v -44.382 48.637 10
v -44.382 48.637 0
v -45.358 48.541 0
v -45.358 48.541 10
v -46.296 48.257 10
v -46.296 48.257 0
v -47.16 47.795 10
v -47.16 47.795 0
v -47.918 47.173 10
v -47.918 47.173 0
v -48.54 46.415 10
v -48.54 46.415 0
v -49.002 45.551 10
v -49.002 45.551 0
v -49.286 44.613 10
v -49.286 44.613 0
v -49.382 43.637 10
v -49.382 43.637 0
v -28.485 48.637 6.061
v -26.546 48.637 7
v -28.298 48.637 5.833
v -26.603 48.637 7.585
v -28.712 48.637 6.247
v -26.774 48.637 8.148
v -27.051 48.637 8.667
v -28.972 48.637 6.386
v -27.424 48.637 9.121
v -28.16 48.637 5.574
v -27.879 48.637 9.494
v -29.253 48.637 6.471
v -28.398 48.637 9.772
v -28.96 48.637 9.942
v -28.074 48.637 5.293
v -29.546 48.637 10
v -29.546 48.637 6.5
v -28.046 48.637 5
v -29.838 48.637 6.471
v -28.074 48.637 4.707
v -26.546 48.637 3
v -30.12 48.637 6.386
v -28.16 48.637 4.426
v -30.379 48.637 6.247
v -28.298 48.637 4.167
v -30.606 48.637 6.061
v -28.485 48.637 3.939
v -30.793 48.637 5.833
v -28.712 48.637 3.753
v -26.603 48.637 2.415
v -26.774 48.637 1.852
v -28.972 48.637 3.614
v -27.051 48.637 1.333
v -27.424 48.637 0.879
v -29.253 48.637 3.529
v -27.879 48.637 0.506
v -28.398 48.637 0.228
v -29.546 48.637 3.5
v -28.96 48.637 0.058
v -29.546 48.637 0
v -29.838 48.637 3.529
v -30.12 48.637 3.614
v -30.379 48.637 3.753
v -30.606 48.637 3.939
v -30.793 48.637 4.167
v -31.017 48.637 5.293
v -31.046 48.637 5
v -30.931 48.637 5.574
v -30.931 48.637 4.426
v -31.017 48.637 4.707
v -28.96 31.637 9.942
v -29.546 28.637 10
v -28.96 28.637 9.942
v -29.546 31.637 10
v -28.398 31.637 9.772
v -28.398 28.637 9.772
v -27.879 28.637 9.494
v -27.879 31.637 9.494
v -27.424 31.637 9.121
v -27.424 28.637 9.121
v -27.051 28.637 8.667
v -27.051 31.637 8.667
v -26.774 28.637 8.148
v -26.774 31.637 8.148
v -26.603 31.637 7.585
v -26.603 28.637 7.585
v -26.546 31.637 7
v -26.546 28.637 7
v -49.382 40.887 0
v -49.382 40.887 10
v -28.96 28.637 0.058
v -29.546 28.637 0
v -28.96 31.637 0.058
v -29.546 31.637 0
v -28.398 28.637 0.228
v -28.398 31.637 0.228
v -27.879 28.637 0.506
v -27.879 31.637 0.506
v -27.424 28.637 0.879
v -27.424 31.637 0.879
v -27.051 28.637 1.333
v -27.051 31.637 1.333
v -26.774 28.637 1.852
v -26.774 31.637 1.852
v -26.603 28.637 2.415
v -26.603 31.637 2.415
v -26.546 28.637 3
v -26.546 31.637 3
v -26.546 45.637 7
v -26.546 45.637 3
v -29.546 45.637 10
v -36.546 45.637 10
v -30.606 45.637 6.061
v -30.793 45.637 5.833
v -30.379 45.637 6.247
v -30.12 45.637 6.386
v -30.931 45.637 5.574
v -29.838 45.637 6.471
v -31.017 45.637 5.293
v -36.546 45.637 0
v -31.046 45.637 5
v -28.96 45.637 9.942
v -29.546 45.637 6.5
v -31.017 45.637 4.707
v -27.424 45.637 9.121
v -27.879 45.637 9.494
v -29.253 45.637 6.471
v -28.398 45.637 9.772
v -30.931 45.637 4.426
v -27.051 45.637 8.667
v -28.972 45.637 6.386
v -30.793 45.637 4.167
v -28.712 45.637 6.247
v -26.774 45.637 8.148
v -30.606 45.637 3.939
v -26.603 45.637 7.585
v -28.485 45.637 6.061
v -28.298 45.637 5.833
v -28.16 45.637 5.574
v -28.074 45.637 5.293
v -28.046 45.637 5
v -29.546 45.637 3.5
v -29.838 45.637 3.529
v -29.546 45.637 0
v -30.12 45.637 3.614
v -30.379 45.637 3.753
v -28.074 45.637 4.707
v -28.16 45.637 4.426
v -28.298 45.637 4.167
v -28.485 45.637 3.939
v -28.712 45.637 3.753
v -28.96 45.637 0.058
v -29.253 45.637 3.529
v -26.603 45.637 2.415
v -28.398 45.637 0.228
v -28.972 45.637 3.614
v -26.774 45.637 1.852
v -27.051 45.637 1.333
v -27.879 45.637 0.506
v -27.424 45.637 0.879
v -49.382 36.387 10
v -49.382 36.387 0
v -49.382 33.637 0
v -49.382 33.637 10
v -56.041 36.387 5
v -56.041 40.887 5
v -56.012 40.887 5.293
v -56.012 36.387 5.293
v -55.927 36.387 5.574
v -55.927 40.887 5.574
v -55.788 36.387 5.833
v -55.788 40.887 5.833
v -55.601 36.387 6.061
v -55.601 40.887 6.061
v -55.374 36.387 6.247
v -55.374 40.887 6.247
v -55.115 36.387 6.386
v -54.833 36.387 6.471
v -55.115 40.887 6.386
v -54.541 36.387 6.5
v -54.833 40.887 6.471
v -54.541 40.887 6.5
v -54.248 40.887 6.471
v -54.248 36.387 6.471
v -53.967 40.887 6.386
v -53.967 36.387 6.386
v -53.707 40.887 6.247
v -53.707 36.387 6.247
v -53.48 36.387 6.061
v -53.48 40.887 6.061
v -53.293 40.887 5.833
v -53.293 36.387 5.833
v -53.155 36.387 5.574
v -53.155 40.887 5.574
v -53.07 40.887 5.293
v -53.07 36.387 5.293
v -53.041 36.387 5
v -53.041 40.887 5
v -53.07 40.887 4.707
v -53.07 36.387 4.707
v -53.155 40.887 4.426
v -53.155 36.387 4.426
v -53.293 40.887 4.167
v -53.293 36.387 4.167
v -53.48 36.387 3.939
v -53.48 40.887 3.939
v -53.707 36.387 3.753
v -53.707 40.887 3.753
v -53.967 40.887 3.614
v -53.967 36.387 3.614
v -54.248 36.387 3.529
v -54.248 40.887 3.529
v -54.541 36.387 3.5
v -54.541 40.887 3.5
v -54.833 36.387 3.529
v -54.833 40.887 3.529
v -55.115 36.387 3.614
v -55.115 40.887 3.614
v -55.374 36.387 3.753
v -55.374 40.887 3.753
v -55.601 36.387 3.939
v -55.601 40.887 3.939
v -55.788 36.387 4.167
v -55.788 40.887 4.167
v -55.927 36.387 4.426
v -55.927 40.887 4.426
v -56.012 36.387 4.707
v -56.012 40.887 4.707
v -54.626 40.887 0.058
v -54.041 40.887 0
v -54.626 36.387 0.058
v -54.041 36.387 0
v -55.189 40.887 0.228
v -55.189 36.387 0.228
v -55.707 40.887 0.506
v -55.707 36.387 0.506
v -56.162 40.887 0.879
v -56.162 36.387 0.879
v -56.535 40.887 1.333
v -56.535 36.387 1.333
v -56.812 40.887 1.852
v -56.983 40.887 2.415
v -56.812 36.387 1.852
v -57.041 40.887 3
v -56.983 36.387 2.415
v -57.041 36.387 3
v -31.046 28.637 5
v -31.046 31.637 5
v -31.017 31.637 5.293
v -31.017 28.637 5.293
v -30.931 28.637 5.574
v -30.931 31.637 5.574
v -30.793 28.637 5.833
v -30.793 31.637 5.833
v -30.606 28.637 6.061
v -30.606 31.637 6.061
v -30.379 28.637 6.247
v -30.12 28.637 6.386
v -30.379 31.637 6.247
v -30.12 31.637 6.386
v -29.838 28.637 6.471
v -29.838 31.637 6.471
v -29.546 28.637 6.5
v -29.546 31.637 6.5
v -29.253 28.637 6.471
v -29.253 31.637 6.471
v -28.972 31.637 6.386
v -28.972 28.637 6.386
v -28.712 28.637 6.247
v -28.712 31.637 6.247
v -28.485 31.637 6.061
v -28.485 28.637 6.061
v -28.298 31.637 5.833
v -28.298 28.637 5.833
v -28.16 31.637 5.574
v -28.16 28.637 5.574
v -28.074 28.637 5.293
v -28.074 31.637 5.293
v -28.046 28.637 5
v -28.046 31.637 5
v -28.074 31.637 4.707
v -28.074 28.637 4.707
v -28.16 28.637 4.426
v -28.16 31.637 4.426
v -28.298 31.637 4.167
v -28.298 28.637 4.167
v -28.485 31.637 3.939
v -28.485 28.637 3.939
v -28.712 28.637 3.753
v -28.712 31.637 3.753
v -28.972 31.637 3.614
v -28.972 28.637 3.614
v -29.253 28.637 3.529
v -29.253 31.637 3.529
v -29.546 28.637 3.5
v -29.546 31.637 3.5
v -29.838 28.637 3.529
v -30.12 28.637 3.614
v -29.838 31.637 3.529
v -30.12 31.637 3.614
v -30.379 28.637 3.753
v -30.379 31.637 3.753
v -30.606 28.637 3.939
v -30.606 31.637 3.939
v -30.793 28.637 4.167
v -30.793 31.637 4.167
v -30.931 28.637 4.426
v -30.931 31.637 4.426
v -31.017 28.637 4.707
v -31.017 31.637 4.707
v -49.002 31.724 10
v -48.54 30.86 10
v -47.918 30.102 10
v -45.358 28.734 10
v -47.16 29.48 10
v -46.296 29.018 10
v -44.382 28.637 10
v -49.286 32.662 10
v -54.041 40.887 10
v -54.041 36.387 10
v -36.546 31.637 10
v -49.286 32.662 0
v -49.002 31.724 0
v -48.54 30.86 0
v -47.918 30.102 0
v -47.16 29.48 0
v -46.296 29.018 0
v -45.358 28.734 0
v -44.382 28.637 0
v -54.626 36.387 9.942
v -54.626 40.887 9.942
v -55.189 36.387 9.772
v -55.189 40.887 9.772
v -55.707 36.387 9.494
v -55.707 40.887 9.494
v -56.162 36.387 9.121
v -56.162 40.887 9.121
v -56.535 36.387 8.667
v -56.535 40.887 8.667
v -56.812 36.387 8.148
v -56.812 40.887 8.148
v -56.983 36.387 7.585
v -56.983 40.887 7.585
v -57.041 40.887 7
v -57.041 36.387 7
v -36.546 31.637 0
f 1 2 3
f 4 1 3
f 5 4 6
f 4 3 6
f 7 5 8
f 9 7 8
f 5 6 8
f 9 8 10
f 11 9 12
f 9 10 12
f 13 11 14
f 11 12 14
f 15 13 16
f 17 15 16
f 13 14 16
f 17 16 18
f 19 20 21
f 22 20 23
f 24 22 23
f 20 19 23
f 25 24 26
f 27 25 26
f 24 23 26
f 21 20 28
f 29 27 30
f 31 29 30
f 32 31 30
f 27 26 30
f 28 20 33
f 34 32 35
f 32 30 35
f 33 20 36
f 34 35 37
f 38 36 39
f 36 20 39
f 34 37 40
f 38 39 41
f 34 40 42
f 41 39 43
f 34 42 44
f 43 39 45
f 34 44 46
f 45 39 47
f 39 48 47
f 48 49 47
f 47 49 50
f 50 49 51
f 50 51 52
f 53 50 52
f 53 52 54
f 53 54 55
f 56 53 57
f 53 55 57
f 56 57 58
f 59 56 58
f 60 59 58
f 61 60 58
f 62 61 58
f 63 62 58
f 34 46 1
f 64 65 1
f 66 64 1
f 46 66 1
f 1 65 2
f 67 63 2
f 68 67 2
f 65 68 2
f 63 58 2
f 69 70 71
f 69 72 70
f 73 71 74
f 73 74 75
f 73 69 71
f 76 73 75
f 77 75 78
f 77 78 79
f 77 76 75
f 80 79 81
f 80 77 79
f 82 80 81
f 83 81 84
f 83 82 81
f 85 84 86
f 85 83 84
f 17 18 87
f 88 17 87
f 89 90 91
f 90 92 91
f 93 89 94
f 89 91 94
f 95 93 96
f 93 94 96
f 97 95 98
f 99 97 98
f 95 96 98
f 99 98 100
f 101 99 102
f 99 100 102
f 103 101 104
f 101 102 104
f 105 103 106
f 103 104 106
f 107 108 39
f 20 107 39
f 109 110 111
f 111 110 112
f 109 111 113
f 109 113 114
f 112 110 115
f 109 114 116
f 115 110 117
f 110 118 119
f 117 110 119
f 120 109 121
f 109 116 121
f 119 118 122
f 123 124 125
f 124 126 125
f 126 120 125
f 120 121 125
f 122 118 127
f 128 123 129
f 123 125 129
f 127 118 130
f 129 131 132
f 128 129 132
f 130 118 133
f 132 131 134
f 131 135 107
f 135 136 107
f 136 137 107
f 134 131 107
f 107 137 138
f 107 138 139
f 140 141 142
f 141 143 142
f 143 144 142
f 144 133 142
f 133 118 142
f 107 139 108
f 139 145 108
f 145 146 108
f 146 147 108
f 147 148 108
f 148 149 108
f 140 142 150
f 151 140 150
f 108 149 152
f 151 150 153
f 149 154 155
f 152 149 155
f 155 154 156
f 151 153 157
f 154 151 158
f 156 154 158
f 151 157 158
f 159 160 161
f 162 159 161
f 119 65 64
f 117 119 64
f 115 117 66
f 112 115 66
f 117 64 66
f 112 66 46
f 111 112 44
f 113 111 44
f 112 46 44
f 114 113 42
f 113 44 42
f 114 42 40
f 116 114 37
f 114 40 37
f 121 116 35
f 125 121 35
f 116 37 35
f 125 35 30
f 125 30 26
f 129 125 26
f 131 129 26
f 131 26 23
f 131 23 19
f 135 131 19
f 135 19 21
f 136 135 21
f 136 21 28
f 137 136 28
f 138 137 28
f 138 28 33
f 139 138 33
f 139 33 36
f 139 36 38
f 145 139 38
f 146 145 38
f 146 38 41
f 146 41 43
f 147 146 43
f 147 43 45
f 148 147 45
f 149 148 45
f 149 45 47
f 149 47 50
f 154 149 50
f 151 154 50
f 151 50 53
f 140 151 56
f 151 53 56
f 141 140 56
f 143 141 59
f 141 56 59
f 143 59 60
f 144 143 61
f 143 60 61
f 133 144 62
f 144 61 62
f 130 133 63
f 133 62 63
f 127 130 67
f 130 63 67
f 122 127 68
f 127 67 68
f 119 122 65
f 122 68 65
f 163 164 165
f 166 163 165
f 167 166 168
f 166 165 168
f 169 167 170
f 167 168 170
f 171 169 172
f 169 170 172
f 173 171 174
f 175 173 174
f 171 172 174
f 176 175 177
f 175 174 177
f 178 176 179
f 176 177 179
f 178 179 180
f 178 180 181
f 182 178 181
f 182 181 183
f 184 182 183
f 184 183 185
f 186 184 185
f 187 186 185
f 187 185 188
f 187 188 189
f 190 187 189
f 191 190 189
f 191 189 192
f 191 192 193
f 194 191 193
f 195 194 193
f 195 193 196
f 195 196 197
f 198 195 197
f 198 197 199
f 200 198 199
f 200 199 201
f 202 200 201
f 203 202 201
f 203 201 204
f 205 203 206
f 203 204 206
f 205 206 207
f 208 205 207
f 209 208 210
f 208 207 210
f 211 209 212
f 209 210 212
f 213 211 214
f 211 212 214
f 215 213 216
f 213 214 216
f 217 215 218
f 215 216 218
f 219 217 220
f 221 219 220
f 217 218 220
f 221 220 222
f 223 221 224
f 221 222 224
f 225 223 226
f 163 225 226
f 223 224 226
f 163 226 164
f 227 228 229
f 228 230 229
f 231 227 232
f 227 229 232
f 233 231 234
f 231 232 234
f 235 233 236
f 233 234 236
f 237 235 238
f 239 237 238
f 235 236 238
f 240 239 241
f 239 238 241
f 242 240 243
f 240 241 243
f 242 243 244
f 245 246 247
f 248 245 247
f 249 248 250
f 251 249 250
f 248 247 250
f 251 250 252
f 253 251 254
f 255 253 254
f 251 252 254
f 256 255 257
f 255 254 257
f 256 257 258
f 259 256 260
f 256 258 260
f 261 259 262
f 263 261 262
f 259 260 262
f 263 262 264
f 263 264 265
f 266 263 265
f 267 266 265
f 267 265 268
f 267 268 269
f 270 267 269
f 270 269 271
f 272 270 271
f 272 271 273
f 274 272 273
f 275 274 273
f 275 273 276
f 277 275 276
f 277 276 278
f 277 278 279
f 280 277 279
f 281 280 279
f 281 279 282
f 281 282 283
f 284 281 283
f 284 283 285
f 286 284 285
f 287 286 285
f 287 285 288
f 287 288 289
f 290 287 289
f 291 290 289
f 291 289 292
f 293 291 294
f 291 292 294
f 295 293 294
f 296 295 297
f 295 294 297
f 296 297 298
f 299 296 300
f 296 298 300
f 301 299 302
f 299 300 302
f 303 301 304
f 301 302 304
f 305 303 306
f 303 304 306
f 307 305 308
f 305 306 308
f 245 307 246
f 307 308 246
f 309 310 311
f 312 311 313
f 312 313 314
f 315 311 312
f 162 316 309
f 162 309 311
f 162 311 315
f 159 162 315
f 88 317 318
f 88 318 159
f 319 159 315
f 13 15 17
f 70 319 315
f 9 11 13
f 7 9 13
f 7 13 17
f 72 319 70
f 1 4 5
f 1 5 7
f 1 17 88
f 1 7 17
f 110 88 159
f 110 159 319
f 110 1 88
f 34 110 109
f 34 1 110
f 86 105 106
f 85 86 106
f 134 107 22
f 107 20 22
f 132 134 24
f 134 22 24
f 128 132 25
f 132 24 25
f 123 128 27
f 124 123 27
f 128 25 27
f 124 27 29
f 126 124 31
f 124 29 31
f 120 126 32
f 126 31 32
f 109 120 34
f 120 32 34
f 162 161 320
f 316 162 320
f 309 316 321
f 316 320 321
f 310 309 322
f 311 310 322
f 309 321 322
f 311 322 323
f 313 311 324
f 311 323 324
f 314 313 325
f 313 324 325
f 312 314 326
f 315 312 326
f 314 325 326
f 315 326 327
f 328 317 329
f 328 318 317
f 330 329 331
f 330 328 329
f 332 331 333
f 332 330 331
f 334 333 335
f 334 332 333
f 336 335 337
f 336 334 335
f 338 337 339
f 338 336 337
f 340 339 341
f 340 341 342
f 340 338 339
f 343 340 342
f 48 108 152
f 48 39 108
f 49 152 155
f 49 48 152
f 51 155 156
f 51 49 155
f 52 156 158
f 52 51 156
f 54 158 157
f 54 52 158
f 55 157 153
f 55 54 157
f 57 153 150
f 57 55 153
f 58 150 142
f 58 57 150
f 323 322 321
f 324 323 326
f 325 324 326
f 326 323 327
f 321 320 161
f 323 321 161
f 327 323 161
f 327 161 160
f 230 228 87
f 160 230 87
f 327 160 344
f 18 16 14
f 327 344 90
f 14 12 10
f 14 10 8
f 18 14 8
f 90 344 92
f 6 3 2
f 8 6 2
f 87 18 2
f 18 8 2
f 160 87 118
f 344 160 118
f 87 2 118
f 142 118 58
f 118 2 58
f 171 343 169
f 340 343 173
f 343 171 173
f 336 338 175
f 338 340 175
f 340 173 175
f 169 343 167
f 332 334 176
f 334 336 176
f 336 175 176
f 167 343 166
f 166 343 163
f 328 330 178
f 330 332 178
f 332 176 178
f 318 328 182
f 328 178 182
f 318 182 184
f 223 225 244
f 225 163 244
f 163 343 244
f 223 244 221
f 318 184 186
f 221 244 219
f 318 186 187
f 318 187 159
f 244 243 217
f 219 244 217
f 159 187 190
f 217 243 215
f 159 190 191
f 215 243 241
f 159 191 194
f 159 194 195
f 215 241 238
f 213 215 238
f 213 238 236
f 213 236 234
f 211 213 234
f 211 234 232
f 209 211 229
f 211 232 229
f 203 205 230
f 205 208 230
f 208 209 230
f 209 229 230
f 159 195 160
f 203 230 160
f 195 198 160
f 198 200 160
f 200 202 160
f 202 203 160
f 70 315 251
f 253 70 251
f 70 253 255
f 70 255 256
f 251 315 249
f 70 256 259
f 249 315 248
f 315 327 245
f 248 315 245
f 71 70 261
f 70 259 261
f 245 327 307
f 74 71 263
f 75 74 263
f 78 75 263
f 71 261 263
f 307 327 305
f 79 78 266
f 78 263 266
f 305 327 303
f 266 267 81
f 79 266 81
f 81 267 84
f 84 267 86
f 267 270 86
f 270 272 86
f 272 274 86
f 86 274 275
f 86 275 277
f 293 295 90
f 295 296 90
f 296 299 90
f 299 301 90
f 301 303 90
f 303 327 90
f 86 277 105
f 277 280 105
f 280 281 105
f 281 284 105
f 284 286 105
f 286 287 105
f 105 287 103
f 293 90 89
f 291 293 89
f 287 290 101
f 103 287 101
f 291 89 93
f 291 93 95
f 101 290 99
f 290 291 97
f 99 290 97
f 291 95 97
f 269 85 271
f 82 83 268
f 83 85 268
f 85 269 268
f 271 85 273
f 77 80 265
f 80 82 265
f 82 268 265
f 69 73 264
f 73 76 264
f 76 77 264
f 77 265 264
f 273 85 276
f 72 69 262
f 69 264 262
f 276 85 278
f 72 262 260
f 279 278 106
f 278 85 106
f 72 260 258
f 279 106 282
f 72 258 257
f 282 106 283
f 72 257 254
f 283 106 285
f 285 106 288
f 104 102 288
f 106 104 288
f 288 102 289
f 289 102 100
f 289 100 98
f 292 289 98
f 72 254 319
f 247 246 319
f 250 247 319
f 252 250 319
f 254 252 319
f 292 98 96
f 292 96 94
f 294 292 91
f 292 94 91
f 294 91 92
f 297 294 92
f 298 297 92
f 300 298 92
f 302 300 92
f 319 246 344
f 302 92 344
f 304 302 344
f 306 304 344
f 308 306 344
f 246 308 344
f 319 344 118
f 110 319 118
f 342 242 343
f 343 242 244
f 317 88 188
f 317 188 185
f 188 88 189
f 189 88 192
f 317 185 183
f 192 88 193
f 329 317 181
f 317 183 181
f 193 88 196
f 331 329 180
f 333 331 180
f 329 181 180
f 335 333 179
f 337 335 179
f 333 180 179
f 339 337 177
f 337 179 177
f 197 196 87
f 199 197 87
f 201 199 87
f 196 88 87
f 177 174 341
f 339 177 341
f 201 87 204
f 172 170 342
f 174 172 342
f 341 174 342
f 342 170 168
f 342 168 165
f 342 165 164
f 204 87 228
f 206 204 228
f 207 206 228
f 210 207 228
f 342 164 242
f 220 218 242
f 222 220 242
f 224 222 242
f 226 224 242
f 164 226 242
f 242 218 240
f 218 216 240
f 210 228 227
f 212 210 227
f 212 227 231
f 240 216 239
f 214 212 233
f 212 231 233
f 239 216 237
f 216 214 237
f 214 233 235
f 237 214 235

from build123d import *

# Parameters (mm, degrees)
F1_DEPTH = 10
F2_R     = 1.5
F3_DEPTH = 25
F4_R     = 3


with BuildPart() as f1:
    # F0 (on Top) → F1 (new body)
    with BuildSketch(Plane.XY):
        with BuildLine():
            Line((-26.545639, 48.637496), (-44.382463, 48.637496))
            ThreePointArc((-44.382463, 48.637496), (-47.917997, 47.17303), (-49.382463, 43.637496))
            Line((-49.382463, 43.637496), (-49.382463, 40.887496))
            Line((-49.382463, 40.887496), (-57.040692, 40.887496))
            Line((-57.040692, 40.887496), (-57.040692, 36.387496))
            Line((-57.040692, 36.387496), (-49.382463, 36.387496))
            Line((-49.382463, 36.387496), (-49.382463, 33.637496))
            ThreePointArc((-49.382463, 33.637496), (-47.917997, 30.101962), (-44.382463, 28.637496))
            Line((-44.382463, 28.637496), (-26.545639, 28.637496))
            Line((-26.545639, 28.637496), (-26.545639, 31.637496))
            Line((-26.545639, 31.637496), (-36.545639, 31.637496))
            Line((-36.545639, 31.637496), (-36.545639, 45.637496))
            Line((-36.545639, 45.637496), (-26.545639, 45.637496))
            Line((-26.545639, 45.637496), (-26.545639, 48.637496))
        make_face()
    extrude(amount=F1_DEPTH)

    # F2 (on face) → F3 (cut)
    with BuildSketch(Plane(origin=(0, 48.637496, 0), x_dir=(-1, 0, 0), z_dir=(0, 1, 0))):
        with Locations((54.540692, 5)):
            Circle(F2_R)
        with Locations((29.545639, 5)):
            Circle(F2_R)
    extrude(amount=-F3_DEPTH, mode=Mode.SUBTRACT)

    # F4
    f4_edges = [f1.edges().sort_by_distance(p)[0] for p in [
        (-57.040692, 38.637496, 10),
        (-57.040692, 38.637496, 0),
        (-26.545639, 47.137496, 10),
        (-26.545639, 30.137496, 10),
        (-26.545639, 47.137496, 0),
        (-26.545639, 30.137496, 0),
    ]]
    fillet(f4_edges, radius=F4_R)


solid = f1.part
